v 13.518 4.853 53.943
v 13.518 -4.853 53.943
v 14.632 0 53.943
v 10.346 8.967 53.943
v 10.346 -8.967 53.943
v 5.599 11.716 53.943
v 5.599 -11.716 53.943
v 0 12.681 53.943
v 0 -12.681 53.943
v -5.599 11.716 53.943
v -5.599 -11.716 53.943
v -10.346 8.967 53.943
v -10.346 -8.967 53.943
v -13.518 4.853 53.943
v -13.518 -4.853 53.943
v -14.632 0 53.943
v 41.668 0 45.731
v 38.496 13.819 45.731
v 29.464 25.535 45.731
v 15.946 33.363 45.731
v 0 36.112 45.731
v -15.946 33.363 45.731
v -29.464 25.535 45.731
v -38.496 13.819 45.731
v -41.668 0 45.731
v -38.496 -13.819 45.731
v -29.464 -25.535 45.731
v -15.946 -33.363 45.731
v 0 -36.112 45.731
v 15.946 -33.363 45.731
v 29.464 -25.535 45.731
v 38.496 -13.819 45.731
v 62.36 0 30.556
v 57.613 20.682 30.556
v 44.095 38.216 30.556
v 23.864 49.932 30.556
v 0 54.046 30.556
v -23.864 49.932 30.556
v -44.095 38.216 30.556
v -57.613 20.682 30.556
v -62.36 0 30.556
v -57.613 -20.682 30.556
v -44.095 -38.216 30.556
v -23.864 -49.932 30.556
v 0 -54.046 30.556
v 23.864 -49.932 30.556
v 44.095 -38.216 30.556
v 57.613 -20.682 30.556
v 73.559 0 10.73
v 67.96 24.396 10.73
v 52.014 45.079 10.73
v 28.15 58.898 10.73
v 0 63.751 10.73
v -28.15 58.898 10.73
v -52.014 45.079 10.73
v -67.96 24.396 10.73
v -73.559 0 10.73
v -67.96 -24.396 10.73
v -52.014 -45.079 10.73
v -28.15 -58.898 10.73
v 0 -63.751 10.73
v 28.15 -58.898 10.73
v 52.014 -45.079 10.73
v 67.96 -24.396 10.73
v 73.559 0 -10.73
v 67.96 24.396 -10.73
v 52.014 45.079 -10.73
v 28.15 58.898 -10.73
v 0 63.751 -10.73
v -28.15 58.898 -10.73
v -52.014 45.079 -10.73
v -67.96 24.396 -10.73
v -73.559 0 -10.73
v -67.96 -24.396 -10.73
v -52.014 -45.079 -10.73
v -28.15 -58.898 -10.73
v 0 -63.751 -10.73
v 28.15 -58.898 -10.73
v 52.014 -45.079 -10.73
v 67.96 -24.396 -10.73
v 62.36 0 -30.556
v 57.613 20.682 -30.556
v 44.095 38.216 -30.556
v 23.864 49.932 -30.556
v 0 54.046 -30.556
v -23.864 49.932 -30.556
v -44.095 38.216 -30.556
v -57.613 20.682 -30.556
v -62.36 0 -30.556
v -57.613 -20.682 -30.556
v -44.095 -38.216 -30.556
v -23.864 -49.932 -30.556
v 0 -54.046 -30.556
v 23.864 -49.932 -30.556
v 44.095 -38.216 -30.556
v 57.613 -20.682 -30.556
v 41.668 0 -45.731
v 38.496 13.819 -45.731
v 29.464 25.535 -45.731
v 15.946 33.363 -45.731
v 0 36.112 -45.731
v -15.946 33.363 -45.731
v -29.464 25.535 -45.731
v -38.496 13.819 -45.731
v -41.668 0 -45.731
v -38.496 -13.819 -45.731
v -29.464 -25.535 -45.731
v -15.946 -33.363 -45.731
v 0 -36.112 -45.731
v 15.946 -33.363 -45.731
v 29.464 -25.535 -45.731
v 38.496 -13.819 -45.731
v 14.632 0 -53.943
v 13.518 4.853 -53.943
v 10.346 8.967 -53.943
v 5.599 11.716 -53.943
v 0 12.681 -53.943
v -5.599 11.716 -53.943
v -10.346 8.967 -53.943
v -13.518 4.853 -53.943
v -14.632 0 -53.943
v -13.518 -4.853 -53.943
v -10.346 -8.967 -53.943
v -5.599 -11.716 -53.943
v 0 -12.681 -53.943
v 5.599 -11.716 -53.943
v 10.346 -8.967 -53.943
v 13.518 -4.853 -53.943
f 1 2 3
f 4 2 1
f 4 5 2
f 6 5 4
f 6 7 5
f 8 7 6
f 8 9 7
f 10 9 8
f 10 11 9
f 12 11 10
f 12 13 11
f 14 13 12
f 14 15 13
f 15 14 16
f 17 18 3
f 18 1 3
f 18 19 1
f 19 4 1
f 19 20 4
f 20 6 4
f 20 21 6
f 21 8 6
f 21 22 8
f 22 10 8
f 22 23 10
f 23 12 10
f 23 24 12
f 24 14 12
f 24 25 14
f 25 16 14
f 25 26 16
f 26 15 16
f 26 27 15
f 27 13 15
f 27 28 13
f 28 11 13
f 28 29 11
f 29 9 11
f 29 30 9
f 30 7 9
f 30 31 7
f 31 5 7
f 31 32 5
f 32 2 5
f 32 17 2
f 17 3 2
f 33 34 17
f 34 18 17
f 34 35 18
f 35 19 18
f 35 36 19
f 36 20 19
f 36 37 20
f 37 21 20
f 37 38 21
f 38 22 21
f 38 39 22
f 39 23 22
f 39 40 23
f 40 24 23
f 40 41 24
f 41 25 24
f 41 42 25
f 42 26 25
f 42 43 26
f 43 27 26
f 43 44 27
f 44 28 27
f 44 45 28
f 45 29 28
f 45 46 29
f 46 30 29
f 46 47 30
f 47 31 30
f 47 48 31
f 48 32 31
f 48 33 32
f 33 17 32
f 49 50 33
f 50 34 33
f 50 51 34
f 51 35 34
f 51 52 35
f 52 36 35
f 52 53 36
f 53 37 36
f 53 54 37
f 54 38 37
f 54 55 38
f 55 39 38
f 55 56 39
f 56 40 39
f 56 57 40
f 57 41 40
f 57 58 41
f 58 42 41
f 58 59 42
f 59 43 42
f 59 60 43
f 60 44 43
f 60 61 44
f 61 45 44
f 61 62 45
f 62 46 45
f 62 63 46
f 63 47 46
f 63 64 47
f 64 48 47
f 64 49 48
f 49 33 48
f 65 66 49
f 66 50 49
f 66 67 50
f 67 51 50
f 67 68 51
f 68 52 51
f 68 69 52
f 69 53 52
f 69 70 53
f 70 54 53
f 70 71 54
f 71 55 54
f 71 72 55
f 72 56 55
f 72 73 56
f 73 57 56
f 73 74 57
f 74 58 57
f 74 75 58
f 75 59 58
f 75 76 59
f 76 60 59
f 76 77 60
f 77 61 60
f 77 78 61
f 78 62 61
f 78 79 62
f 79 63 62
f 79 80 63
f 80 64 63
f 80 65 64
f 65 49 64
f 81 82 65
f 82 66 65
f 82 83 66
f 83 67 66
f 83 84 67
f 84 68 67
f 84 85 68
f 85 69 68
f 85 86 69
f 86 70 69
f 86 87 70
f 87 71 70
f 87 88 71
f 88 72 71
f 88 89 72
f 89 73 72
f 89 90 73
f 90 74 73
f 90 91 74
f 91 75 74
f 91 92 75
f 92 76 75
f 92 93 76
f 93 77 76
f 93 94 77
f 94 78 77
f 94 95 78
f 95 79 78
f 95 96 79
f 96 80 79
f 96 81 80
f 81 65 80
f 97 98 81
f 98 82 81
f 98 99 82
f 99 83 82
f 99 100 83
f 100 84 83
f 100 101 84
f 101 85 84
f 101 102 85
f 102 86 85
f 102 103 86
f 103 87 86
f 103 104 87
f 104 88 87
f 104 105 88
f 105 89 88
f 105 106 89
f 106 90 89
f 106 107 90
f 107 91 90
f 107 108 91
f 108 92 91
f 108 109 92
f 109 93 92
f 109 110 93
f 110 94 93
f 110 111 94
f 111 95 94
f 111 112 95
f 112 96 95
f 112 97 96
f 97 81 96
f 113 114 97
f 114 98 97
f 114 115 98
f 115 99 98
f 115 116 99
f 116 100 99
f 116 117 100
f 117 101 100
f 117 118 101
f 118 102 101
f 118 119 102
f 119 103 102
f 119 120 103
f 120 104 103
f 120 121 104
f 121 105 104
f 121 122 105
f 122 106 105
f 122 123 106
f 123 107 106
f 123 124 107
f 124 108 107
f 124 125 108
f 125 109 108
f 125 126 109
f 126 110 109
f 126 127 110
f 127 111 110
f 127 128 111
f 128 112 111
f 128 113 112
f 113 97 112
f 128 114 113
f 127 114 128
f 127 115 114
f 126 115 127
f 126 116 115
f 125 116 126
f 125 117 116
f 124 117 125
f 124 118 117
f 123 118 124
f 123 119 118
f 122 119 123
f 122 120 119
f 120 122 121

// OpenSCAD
// Generated by SolidPython 1.0.1 on 2020-07-29 00:46:52


scale(v = [15, 13, 11]) {
	sphere(r = 5);
}
/***********************************************
*********      SolidPython code:      **********
************************************************
 
# import packages: SolidPython
from solid import *
from solid.utils import *
from itertools import chain, combinations, permutations


class Resize:

    def __init__(self, scad_file):
        self.scad_file = scad_file
        #self.scad_file = import_scad(scad_file)
        # cone/cylinder param:
        self.r1 = 0
        self.r2 = 0
        self.h = 0
        # rectangular prism param:
        self.w = 0
        self.l = 0
        # ellipse param:
        self.r = 0

    # import OpenScad code (file name corresponds to shape)


    # classify shape + parameters
    def assign(self, param1, param2, param3):
        if self.scad_file == 'cone.scad':
            self.r1 = param1
            self.r2 = param2
            self.h = param3
        elif self.scad_file == 'cylinder.scad':
            self.r1 = param1
            self.r2 = param2
            self.h = param3
        elif self.scad_file == 'rectangularPrism.scad':
            self.h = param1
            self.l = param2
            self.w = param3
        else:
            self.r = param1
            self.h = param2

    # resize parameters
    def iterate(self):
        x = range(3, 20, 2)
        i = 1
        if self.scad_file == 'cone.scad':
            tempList = list(permutations(x, 2))
            for temp in tempList:
                param1 = temp[0]
                param2 = temp[1]
                filepath = 'produced_scad_files/' + 'cone' + str(param1) + '_' + str(param2) + '_' + '.scad'
                scad_render_to_file(cylinder(h=param1, r1=param2, r2=0), filepath)

        elif self.scad_file == 'cylinder.scad':
            tempList = list(permutations(x, 3))
            for temp in tempList:
                param1 = temp[0]
                param2 = temp[1]
                filepath = 'produced_scad_files/' + 'cylinder' + str(param1) + '_' + str(param2) + '_' + '.scad'
                scad_render_to_file(cylinder(h=param1, r1=param2, r2=param2), filepath)

        elif self.scad_file == 'rectangularPrism.scad':
            tempList = list(permutations(x, 3))
            for temp in tempList:
                param1 = temp[0]
                param2 = temp[1]
                param3 = temp[2]
                filepath = 'produced_scad_files/' + 'rectangularPrism' + str(param1) + '_' + str(param2) + '_' + str(
                    param3) + '.scad'
                scad_render_to_file(cube(size=(param1, param2, param3)), filepath)

        elif self.scad_file == 'ellipse.scad':
            tempList = list(permutations(x, 4))
            for temp in tempList:
                param1 = temp[0]
                param2 = temp[1]
                param3 = temp[2]
                param4 = temp[3]
                filepath = 'produced_scad_files/' + 'ellipse' + str(param1) + '_' + str(param2) + '_' + str(param3) + '_' + str(param4) + '.scad'
                scad_render_to_file(scale([param1, param2, param3])(sphere(r=param4)), filepath)

    def render_to_scadfile(self):
        scad_render_to_file(scad, 'example.scad') 
 
************************************************/
